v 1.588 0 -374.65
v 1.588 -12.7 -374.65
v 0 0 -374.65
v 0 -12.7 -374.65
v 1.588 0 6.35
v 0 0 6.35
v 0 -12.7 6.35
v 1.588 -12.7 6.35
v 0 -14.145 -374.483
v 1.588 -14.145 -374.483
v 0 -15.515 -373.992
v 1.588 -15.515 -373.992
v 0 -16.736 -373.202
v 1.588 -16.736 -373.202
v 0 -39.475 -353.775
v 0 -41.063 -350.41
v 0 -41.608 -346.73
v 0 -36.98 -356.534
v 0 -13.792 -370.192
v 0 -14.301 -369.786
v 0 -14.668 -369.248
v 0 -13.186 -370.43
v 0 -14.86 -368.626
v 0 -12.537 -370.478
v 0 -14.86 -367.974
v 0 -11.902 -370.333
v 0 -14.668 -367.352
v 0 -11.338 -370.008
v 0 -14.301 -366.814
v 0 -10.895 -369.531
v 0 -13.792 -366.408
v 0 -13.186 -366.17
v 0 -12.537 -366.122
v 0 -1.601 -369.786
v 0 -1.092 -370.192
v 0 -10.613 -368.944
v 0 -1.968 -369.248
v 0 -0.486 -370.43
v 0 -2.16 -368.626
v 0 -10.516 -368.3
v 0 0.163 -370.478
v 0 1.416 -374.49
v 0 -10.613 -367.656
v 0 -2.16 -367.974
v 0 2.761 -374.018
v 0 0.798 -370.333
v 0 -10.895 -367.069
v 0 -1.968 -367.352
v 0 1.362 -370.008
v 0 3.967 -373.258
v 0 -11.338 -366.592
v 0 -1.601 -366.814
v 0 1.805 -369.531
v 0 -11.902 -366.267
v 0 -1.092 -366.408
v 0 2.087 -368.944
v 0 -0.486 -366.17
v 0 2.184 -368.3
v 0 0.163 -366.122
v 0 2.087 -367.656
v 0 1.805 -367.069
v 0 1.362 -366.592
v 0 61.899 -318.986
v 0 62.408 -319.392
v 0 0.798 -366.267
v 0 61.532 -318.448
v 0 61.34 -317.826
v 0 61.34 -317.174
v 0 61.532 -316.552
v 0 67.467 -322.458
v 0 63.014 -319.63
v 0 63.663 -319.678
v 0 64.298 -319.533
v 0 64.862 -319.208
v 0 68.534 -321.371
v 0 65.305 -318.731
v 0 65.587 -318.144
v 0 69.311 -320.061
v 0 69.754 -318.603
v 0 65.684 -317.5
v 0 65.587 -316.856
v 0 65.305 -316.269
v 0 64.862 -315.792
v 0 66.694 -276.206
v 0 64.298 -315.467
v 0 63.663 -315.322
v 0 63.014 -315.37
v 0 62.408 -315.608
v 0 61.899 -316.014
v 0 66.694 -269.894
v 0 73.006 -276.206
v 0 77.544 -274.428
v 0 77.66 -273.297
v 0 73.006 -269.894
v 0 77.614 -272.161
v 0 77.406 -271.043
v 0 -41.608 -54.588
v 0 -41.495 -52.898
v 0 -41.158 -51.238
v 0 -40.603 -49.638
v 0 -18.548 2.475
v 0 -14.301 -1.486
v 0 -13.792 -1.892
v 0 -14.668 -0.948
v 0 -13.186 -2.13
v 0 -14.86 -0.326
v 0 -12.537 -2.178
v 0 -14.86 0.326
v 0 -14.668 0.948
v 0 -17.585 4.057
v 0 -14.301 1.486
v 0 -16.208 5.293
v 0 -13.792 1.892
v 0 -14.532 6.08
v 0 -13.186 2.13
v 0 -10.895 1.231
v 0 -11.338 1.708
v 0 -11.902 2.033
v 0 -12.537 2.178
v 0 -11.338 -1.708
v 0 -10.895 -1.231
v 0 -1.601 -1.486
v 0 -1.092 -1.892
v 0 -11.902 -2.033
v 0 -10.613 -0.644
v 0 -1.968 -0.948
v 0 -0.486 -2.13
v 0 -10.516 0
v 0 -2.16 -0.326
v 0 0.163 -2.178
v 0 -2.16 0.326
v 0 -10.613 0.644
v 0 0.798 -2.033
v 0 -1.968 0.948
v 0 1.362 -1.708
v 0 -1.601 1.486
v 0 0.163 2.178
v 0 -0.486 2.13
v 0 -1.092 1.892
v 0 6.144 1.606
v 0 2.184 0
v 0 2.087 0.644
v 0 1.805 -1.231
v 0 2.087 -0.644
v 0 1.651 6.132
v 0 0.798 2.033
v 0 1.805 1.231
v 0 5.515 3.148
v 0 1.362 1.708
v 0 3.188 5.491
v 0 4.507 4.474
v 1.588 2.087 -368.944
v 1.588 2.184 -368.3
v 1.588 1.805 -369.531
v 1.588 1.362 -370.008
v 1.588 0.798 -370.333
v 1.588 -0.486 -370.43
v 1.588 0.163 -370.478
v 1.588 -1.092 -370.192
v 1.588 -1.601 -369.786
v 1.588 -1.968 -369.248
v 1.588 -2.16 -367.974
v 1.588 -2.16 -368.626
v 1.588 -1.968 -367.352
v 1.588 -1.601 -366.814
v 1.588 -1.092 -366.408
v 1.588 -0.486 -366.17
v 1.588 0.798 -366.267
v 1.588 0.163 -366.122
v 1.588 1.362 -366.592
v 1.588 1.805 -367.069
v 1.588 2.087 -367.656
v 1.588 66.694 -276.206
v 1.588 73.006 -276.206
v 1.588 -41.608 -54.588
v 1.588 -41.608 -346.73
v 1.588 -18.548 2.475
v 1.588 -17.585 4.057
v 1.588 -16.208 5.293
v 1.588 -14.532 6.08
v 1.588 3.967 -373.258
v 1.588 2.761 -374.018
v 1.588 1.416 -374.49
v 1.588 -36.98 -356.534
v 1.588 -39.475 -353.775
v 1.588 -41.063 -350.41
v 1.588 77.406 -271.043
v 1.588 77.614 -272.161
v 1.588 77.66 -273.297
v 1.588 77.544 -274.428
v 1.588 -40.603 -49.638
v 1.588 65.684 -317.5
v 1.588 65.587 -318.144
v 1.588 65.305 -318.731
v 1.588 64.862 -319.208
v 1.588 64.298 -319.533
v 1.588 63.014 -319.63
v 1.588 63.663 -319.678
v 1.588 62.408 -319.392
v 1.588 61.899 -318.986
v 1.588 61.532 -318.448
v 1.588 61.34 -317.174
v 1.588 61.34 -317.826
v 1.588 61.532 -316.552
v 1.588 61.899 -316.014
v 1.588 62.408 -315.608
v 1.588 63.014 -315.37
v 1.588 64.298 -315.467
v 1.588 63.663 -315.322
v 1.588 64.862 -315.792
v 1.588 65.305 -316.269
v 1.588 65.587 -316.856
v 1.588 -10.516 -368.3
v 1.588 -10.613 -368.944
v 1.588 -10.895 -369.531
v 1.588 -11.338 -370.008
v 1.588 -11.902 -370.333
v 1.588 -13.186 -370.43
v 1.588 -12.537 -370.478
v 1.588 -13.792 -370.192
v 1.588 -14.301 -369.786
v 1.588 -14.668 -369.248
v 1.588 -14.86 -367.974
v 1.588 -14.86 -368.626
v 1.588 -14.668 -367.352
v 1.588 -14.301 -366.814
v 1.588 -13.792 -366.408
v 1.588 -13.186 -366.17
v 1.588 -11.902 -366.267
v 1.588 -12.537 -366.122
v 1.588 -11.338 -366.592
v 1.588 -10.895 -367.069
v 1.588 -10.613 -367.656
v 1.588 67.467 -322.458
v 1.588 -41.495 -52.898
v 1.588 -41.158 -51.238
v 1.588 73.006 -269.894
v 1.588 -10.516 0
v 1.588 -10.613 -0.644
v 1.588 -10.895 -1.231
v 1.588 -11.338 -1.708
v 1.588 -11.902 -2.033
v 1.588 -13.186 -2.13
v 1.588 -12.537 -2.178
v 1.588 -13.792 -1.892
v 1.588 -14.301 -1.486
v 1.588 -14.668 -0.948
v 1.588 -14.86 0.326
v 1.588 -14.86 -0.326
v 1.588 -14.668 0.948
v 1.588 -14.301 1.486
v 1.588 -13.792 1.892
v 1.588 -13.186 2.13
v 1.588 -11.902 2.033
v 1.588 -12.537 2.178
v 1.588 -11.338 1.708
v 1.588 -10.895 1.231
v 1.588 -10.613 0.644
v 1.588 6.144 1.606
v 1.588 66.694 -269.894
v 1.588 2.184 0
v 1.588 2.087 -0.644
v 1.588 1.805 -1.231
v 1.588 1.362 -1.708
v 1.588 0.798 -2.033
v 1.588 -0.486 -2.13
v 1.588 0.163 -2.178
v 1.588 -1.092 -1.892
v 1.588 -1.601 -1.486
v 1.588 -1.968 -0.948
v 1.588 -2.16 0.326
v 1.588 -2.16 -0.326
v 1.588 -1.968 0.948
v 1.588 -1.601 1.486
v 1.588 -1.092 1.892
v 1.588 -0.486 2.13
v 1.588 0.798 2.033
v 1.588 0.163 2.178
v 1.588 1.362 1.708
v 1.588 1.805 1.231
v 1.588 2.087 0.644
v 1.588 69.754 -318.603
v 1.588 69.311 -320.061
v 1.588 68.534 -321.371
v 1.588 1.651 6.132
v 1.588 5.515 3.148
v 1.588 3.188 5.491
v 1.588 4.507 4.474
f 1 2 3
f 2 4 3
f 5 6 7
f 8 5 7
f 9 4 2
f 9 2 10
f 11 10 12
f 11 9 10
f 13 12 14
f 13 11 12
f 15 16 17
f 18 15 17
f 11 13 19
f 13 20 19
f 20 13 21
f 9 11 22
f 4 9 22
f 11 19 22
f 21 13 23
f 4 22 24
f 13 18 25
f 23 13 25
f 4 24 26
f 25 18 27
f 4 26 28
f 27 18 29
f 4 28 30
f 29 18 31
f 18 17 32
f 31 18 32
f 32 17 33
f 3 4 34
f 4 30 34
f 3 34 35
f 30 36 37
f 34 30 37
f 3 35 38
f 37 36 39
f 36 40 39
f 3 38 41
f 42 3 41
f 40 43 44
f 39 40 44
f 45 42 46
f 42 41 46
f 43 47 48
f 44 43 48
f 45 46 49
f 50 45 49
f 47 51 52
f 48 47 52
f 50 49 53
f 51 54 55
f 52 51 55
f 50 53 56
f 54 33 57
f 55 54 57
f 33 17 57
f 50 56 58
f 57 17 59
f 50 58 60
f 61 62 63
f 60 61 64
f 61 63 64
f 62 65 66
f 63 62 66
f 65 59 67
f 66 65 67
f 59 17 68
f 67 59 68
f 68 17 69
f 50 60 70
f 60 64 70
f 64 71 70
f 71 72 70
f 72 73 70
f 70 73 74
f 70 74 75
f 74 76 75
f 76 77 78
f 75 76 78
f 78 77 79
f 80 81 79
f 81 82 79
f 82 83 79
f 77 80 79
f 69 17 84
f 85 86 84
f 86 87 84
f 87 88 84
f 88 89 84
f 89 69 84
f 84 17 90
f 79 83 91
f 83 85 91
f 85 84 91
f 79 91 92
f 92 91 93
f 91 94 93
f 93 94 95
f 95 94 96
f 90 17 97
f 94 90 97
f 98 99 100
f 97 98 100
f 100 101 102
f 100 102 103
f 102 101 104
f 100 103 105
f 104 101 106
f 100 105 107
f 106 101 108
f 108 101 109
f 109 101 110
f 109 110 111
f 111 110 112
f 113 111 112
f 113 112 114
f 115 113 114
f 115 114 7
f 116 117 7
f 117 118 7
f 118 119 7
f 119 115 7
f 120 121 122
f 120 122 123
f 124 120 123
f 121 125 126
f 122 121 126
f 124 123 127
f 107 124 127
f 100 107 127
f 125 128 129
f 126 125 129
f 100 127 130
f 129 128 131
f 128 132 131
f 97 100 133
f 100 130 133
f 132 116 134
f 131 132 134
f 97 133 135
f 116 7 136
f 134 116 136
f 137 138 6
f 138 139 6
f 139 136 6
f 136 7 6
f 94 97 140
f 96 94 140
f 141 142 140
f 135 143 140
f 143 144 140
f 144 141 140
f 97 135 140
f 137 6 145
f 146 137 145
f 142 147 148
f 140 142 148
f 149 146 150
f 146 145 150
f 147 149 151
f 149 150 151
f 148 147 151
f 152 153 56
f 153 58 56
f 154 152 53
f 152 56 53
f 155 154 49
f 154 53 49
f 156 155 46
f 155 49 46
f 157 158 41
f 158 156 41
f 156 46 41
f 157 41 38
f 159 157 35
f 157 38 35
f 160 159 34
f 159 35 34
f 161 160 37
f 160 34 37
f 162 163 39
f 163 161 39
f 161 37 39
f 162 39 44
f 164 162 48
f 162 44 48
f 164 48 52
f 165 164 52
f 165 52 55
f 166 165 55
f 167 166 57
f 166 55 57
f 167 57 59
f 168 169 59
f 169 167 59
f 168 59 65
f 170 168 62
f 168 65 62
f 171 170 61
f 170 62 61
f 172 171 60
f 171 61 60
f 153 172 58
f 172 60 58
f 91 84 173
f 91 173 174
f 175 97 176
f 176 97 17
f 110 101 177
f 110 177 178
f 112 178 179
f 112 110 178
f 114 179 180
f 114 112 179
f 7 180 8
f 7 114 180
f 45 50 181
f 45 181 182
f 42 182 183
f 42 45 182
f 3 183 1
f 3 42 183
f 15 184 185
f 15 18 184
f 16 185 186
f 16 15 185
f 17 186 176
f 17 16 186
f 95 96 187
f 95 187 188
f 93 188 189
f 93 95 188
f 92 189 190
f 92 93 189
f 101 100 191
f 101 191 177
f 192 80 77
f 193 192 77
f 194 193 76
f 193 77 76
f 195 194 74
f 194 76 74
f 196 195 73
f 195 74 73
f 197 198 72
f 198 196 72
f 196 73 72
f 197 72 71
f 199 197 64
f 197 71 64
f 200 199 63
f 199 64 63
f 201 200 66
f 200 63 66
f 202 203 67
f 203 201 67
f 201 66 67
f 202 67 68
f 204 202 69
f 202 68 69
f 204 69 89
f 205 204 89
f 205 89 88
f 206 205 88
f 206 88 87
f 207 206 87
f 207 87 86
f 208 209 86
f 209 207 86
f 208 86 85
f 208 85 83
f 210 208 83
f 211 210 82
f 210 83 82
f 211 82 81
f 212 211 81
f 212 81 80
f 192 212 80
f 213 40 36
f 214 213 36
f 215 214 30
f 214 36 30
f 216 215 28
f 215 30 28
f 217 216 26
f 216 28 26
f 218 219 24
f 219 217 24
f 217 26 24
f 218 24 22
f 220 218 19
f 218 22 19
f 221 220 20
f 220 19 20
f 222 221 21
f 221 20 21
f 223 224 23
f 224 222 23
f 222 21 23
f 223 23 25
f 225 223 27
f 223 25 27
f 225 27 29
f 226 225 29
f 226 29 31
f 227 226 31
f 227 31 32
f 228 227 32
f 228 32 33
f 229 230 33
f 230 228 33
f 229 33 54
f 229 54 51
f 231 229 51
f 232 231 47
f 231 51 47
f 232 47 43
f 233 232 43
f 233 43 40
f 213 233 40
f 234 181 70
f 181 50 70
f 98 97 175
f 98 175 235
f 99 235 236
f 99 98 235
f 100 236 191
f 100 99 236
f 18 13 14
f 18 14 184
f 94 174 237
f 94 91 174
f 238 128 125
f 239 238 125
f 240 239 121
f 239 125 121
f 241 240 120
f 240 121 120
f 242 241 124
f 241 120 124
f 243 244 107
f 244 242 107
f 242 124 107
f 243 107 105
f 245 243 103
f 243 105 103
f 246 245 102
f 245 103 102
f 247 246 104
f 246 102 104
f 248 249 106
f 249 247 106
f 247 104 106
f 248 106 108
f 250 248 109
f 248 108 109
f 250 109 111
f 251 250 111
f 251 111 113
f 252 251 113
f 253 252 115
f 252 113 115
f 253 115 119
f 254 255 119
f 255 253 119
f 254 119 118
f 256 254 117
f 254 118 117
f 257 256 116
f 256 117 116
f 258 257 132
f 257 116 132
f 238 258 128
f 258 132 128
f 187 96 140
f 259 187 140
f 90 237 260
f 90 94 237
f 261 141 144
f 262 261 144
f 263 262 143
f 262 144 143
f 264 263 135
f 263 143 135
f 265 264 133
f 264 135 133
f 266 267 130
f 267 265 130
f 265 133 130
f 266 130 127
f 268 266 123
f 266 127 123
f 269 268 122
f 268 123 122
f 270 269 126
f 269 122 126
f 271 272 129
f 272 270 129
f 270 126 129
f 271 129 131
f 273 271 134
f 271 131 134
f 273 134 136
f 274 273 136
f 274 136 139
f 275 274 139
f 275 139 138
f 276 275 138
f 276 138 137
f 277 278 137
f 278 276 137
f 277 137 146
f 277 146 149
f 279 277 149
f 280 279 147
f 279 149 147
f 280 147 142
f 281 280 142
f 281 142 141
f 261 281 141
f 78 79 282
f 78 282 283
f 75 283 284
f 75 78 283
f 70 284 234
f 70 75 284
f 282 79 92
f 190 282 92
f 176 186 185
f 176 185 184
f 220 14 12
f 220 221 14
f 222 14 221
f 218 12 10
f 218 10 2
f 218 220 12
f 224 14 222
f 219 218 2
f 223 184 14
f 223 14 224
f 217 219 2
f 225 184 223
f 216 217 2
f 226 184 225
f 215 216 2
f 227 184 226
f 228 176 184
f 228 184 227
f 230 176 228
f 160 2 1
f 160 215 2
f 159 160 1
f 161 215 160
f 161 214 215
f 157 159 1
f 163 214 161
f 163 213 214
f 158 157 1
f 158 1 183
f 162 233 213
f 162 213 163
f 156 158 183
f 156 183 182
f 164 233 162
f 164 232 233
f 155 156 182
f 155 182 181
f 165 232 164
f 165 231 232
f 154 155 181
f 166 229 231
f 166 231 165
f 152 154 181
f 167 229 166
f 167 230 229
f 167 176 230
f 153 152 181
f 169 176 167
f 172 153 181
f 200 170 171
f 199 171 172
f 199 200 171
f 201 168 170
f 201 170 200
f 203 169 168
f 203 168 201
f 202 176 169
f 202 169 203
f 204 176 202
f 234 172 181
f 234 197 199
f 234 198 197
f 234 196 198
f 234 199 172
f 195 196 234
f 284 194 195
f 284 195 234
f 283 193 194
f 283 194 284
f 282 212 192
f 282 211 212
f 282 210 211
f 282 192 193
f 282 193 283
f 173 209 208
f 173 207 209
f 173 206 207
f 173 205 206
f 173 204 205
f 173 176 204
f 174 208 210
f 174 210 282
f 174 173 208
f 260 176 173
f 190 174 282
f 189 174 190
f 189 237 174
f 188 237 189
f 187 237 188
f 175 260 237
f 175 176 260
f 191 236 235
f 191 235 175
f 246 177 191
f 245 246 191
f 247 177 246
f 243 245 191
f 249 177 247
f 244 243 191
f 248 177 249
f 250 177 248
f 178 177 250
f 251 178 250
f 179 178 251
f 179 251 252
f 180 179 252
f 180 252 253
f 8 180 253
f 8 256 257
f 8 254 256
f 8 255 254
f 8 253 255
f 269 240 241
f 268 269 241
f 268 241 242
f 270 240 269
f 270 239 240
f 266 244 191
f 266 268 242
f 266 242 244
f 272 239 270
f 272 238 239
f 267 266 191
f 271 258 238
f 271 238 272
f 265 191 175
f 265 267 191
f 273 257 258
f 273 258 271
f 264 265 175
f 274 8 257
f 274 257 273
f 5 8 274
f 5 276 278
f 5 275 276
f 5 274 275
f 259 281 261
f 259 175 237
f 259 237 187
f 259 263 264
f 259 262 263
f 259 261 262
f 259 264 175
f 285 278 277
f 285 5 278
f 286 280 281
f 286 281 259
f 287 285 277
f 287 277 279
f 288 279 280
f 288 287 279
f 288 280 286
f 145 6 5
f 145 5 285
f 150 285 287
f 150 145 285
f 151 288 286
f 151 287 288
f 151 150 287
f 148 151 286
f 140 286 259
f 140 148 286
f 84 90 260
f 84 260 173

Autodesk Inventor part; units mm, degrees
ref_plane "YZ Plane" through (0, 0, 0) normal (1, 0, 0) x (0, 1, 0)
ref_plane "XZ Plane" through (0, 0, 0) normal (0, 1, 0) x (-1, 0, 0)
ref_plane "XY Plane" through (0, 0, 0) normal (0, 0, 1) x (1, 0, 0)
sketch "maiin" plane through (0, 0, 0) normal (0, 0, 1) x (1, 0, 0)
  circle A0 centre (114.3234, 350.4213) radius 2.1844
  circle A1 centre (127.0234, 350.4213) radius 2.1844
  line L0 (86.4201, 300.7833) -> (108.4755, 352.8962)
  arc A2 (86.4201, 300.7833) -> (85.4157, 295.8335) centre (98.1157, 295.8335) ccw
  line L1 (209.5734, 102.7713) -> (133.0946, 352.2822)
  line L2 (209.5734, 96.4213) -> (209.5734, 102.7713)
  circle A3 centre (203.2234, 96.4213) radius 2.1844
  arc A4 (209.45, 95.176) -> (209.5734, 96.4213) centre (203.2234, 96.4213) ccw
  line L3 (196.75, 31.676) -> (209.45, 95.176)
  circle A5 centre (190.5234, 32.9213) radius 2.1844
  line L4 (85.4157, 295.8335) -> (85.4157, 3.6912)
  circle A6 centre (127.0234, -17.8787) radius 2.1844
  circle A7 centre (114.3234, -17.8787) radius 2.1844
  arc A8 (127.0234, -24.2287) -> (130.9902, -22.8372) centre (127.0234, -17.8787) ccw
  arc A9 (110.2871, -22.7809) -> (114.3234, -24.2287) centre (114.3234, -17.8787) ccw
  arc A10 (194.4902, 27.9628) -> (196.75, 31.676) centre (190.5234, 32.9213) ccw
  arc A11 (85.4157, 3.6912) -> (90.0433, -6.1132) centre (98.1157, 3.6912) ccw
  line L5 (130.9902, -22.8372) -> (194.4902, 27.9628)
  line L6 (110.2871, -22.7809) -> (90.0433, -6.1132)
  line L7 (114.3234, -24.2287) -> (127.0234, -24.2287)
  arc A12 (114.3234, 356.7713) -> (108.4755, 352.8962) centre (114.3234, 350.4213) ccw
  line L8 (127.0234, 356.7713) -> (114.3234, 356.7713)
  arc A13 (133.0946, 352.2822) -> (127.0234, 356.7713) centre (127.0234, 350.4213) ccw
  point P0 (137.6055, 139.9011)
  point P1 (110.8157, 355.7146)
  dimension "d0" = 12.7
  dimension "d1" = 12.7
  dimension "d2" = 25.4
sketch "main" plane through (0, 0, 0) normal (0, 0, 1) x (1, 0, 0)
  line L0 (253.2515, -237.7425) -> (261.0416, -193.5682)
  circle A0 centre (170.798, 80.8603) radius 2.1844
  circle A1 centre (183.498, 80.8603) radius 2.1844
  circle A2 centre (246.998, -236.6397) radius 2.1844
  arc A3 (189.6416, 82.4661) -> (183.498, 87.2103) centre (183.498, 80.8603) ccw
  arc A4 (170.798, 87.2103) -> (164.9502, 83.3353) centre (170.798, 80.8603) ccw
  line L1 (183.498, 87.2103) -> (170.798, 87.2103)
  line L2 (141.8904, 26.2725) -> (141.8904, -265.8697)
  line L3 (260.9042, -190.1825) -> (189.6416, 82.4661)
  arc A5 (142.8948, 31.2224) -> (141.8904, 26.2725) centre (154.5904, 26.2725) ccw
  line L4 (142.8948, 31.2224) -> (164.9502, 83.3353)
  arc A6 (250.9648, -241.5982) -> (253.2515, -237.7425) centre (246.998, -236.6397) ccw
  line L5 (187.4648, -292.3982) -> (250.9648, -241.5982)
  circle A7 centre (183.498, -287.4397) radius 2.1844
  arc A8 (183.498, -293.7897) -> (187.4648, -292.3982) centre (183.498, -287.4397) ccw
  circle A9 centre (170.798, -287.4397) radius 2.1844
  line L6 (170.798, -293.7897) -> (183.498, -293.7897)
  arc A10 (166.7618, -292.3419) -> (170.798, -293.7897) centre (170.798, -287.4397) ccw
  arc A11 (141.8904, -265.8697) -> (146.518, -275.6741) centre (154.5904, -265.8697) ccw
  line L7 (166.7618, -292.3419) -> (146.518, -275.6741)
  arc A12 (261.0416, -193.5682) -> (260.9042, -190.1825) centre (253.2247, -192.1897) ccw
  point P0 (195.6606, -131.3273)
  point P1 (167.2904, 86.1536)
  dimension "d6" = 12.7
  dimension "d7" = 25.4
  dimension "d10" = 15.875
sketch "Sketch1" plane through (0, 0, 0) normal (1, 0, 0) x (0, 1, 0)
  line L0 (73.006, -269.894) -> (66.6941, -269.894)
  line L1 (66.6941, -269.894) -> (66.6941, -276.2059)
  line L2 (66.6941, -276.2059) -> (73.006, -276.2059)
  line L3 (73.006, -276.2059) -> (73.006, -269.894)
  line L4 (73.006, -269.894) -> (66.6941, -276.2059) construction
  line L5 (66.6941, -269.894) -> (73.006, -276.2059) construction
  line L6 (69.7535, -318.6028) -> (77.5436, -274.4285)
  circle A0 centre (-12.7, 0) radius 2.1844
  circle A1 centre (0, 0) radius 2.1844
  circle A2 centre (63.5, -317.5) radius 2.1844
  arc A3 (6.1436, 1.6058) -> (0, 6.35) centre (0, 0) ccw
  arc A4 (-12.7, 6.35) -> (-18.5478, 2.4749) centre (-12.7, 0) ccw
  line L7 (0, 6.35) -> (-12.7, 6.35)
  line L8 (-41.6076, -54.5878) -> (-41.6076, -346.7301)
  line L9 (77.4062, -271.0428) -> (6.1436, 1.6058)
  arc A5 (-40.6033, -49.6379) -> (-41.6076, -54.5878) centre (-28.9076, -54.5878) ccw
  line L10 (-40.6033, -49.6379) -> (-18.5478, 2.4749)
  arc A6 (67.4668, -322.4585) -> (69.7535, -318.6028) centre (63.5, -317.5) ccw
  line L11 (3.9668, -373.2585) -> (67.4668, -322.4585)
  circle A7 centre (0, -368.3) radius 2.1844
  arc A8 (0, -374.65) -> (3.9668, -373.2585) centre (0, -368.3) ccw
  circle A9 centre (-12.7, -368.3) radius 2.1844
  line L12 (-12.7, -374.65) -> (0, -374.65)
  arc A10 (-16.7362, -373.2022) -> (-12.7, -374.65) centre (-12.7, -368.3) ccw
  arc A11 (-41.6076, -346.7301) -> (-36.98, -356.5344) centre (-28.9076, -346.7301) ccw
  line L13 (-16.7362, -373.2022) -> (-36.98, -356.5344)
  arc A12 (77.5436, -274.4285) -> (77.4062, -271.0428) centre (69.7267, -273.05) ccw
  point P0 (69.85, -273.05)
  dimension "d8" = 6.3119
  dimension "d9" = 6.3119
extrude "Extrusion1" add sketch "Sketch1" along normal blind 1.5875
properties part number "skirt_updated"
